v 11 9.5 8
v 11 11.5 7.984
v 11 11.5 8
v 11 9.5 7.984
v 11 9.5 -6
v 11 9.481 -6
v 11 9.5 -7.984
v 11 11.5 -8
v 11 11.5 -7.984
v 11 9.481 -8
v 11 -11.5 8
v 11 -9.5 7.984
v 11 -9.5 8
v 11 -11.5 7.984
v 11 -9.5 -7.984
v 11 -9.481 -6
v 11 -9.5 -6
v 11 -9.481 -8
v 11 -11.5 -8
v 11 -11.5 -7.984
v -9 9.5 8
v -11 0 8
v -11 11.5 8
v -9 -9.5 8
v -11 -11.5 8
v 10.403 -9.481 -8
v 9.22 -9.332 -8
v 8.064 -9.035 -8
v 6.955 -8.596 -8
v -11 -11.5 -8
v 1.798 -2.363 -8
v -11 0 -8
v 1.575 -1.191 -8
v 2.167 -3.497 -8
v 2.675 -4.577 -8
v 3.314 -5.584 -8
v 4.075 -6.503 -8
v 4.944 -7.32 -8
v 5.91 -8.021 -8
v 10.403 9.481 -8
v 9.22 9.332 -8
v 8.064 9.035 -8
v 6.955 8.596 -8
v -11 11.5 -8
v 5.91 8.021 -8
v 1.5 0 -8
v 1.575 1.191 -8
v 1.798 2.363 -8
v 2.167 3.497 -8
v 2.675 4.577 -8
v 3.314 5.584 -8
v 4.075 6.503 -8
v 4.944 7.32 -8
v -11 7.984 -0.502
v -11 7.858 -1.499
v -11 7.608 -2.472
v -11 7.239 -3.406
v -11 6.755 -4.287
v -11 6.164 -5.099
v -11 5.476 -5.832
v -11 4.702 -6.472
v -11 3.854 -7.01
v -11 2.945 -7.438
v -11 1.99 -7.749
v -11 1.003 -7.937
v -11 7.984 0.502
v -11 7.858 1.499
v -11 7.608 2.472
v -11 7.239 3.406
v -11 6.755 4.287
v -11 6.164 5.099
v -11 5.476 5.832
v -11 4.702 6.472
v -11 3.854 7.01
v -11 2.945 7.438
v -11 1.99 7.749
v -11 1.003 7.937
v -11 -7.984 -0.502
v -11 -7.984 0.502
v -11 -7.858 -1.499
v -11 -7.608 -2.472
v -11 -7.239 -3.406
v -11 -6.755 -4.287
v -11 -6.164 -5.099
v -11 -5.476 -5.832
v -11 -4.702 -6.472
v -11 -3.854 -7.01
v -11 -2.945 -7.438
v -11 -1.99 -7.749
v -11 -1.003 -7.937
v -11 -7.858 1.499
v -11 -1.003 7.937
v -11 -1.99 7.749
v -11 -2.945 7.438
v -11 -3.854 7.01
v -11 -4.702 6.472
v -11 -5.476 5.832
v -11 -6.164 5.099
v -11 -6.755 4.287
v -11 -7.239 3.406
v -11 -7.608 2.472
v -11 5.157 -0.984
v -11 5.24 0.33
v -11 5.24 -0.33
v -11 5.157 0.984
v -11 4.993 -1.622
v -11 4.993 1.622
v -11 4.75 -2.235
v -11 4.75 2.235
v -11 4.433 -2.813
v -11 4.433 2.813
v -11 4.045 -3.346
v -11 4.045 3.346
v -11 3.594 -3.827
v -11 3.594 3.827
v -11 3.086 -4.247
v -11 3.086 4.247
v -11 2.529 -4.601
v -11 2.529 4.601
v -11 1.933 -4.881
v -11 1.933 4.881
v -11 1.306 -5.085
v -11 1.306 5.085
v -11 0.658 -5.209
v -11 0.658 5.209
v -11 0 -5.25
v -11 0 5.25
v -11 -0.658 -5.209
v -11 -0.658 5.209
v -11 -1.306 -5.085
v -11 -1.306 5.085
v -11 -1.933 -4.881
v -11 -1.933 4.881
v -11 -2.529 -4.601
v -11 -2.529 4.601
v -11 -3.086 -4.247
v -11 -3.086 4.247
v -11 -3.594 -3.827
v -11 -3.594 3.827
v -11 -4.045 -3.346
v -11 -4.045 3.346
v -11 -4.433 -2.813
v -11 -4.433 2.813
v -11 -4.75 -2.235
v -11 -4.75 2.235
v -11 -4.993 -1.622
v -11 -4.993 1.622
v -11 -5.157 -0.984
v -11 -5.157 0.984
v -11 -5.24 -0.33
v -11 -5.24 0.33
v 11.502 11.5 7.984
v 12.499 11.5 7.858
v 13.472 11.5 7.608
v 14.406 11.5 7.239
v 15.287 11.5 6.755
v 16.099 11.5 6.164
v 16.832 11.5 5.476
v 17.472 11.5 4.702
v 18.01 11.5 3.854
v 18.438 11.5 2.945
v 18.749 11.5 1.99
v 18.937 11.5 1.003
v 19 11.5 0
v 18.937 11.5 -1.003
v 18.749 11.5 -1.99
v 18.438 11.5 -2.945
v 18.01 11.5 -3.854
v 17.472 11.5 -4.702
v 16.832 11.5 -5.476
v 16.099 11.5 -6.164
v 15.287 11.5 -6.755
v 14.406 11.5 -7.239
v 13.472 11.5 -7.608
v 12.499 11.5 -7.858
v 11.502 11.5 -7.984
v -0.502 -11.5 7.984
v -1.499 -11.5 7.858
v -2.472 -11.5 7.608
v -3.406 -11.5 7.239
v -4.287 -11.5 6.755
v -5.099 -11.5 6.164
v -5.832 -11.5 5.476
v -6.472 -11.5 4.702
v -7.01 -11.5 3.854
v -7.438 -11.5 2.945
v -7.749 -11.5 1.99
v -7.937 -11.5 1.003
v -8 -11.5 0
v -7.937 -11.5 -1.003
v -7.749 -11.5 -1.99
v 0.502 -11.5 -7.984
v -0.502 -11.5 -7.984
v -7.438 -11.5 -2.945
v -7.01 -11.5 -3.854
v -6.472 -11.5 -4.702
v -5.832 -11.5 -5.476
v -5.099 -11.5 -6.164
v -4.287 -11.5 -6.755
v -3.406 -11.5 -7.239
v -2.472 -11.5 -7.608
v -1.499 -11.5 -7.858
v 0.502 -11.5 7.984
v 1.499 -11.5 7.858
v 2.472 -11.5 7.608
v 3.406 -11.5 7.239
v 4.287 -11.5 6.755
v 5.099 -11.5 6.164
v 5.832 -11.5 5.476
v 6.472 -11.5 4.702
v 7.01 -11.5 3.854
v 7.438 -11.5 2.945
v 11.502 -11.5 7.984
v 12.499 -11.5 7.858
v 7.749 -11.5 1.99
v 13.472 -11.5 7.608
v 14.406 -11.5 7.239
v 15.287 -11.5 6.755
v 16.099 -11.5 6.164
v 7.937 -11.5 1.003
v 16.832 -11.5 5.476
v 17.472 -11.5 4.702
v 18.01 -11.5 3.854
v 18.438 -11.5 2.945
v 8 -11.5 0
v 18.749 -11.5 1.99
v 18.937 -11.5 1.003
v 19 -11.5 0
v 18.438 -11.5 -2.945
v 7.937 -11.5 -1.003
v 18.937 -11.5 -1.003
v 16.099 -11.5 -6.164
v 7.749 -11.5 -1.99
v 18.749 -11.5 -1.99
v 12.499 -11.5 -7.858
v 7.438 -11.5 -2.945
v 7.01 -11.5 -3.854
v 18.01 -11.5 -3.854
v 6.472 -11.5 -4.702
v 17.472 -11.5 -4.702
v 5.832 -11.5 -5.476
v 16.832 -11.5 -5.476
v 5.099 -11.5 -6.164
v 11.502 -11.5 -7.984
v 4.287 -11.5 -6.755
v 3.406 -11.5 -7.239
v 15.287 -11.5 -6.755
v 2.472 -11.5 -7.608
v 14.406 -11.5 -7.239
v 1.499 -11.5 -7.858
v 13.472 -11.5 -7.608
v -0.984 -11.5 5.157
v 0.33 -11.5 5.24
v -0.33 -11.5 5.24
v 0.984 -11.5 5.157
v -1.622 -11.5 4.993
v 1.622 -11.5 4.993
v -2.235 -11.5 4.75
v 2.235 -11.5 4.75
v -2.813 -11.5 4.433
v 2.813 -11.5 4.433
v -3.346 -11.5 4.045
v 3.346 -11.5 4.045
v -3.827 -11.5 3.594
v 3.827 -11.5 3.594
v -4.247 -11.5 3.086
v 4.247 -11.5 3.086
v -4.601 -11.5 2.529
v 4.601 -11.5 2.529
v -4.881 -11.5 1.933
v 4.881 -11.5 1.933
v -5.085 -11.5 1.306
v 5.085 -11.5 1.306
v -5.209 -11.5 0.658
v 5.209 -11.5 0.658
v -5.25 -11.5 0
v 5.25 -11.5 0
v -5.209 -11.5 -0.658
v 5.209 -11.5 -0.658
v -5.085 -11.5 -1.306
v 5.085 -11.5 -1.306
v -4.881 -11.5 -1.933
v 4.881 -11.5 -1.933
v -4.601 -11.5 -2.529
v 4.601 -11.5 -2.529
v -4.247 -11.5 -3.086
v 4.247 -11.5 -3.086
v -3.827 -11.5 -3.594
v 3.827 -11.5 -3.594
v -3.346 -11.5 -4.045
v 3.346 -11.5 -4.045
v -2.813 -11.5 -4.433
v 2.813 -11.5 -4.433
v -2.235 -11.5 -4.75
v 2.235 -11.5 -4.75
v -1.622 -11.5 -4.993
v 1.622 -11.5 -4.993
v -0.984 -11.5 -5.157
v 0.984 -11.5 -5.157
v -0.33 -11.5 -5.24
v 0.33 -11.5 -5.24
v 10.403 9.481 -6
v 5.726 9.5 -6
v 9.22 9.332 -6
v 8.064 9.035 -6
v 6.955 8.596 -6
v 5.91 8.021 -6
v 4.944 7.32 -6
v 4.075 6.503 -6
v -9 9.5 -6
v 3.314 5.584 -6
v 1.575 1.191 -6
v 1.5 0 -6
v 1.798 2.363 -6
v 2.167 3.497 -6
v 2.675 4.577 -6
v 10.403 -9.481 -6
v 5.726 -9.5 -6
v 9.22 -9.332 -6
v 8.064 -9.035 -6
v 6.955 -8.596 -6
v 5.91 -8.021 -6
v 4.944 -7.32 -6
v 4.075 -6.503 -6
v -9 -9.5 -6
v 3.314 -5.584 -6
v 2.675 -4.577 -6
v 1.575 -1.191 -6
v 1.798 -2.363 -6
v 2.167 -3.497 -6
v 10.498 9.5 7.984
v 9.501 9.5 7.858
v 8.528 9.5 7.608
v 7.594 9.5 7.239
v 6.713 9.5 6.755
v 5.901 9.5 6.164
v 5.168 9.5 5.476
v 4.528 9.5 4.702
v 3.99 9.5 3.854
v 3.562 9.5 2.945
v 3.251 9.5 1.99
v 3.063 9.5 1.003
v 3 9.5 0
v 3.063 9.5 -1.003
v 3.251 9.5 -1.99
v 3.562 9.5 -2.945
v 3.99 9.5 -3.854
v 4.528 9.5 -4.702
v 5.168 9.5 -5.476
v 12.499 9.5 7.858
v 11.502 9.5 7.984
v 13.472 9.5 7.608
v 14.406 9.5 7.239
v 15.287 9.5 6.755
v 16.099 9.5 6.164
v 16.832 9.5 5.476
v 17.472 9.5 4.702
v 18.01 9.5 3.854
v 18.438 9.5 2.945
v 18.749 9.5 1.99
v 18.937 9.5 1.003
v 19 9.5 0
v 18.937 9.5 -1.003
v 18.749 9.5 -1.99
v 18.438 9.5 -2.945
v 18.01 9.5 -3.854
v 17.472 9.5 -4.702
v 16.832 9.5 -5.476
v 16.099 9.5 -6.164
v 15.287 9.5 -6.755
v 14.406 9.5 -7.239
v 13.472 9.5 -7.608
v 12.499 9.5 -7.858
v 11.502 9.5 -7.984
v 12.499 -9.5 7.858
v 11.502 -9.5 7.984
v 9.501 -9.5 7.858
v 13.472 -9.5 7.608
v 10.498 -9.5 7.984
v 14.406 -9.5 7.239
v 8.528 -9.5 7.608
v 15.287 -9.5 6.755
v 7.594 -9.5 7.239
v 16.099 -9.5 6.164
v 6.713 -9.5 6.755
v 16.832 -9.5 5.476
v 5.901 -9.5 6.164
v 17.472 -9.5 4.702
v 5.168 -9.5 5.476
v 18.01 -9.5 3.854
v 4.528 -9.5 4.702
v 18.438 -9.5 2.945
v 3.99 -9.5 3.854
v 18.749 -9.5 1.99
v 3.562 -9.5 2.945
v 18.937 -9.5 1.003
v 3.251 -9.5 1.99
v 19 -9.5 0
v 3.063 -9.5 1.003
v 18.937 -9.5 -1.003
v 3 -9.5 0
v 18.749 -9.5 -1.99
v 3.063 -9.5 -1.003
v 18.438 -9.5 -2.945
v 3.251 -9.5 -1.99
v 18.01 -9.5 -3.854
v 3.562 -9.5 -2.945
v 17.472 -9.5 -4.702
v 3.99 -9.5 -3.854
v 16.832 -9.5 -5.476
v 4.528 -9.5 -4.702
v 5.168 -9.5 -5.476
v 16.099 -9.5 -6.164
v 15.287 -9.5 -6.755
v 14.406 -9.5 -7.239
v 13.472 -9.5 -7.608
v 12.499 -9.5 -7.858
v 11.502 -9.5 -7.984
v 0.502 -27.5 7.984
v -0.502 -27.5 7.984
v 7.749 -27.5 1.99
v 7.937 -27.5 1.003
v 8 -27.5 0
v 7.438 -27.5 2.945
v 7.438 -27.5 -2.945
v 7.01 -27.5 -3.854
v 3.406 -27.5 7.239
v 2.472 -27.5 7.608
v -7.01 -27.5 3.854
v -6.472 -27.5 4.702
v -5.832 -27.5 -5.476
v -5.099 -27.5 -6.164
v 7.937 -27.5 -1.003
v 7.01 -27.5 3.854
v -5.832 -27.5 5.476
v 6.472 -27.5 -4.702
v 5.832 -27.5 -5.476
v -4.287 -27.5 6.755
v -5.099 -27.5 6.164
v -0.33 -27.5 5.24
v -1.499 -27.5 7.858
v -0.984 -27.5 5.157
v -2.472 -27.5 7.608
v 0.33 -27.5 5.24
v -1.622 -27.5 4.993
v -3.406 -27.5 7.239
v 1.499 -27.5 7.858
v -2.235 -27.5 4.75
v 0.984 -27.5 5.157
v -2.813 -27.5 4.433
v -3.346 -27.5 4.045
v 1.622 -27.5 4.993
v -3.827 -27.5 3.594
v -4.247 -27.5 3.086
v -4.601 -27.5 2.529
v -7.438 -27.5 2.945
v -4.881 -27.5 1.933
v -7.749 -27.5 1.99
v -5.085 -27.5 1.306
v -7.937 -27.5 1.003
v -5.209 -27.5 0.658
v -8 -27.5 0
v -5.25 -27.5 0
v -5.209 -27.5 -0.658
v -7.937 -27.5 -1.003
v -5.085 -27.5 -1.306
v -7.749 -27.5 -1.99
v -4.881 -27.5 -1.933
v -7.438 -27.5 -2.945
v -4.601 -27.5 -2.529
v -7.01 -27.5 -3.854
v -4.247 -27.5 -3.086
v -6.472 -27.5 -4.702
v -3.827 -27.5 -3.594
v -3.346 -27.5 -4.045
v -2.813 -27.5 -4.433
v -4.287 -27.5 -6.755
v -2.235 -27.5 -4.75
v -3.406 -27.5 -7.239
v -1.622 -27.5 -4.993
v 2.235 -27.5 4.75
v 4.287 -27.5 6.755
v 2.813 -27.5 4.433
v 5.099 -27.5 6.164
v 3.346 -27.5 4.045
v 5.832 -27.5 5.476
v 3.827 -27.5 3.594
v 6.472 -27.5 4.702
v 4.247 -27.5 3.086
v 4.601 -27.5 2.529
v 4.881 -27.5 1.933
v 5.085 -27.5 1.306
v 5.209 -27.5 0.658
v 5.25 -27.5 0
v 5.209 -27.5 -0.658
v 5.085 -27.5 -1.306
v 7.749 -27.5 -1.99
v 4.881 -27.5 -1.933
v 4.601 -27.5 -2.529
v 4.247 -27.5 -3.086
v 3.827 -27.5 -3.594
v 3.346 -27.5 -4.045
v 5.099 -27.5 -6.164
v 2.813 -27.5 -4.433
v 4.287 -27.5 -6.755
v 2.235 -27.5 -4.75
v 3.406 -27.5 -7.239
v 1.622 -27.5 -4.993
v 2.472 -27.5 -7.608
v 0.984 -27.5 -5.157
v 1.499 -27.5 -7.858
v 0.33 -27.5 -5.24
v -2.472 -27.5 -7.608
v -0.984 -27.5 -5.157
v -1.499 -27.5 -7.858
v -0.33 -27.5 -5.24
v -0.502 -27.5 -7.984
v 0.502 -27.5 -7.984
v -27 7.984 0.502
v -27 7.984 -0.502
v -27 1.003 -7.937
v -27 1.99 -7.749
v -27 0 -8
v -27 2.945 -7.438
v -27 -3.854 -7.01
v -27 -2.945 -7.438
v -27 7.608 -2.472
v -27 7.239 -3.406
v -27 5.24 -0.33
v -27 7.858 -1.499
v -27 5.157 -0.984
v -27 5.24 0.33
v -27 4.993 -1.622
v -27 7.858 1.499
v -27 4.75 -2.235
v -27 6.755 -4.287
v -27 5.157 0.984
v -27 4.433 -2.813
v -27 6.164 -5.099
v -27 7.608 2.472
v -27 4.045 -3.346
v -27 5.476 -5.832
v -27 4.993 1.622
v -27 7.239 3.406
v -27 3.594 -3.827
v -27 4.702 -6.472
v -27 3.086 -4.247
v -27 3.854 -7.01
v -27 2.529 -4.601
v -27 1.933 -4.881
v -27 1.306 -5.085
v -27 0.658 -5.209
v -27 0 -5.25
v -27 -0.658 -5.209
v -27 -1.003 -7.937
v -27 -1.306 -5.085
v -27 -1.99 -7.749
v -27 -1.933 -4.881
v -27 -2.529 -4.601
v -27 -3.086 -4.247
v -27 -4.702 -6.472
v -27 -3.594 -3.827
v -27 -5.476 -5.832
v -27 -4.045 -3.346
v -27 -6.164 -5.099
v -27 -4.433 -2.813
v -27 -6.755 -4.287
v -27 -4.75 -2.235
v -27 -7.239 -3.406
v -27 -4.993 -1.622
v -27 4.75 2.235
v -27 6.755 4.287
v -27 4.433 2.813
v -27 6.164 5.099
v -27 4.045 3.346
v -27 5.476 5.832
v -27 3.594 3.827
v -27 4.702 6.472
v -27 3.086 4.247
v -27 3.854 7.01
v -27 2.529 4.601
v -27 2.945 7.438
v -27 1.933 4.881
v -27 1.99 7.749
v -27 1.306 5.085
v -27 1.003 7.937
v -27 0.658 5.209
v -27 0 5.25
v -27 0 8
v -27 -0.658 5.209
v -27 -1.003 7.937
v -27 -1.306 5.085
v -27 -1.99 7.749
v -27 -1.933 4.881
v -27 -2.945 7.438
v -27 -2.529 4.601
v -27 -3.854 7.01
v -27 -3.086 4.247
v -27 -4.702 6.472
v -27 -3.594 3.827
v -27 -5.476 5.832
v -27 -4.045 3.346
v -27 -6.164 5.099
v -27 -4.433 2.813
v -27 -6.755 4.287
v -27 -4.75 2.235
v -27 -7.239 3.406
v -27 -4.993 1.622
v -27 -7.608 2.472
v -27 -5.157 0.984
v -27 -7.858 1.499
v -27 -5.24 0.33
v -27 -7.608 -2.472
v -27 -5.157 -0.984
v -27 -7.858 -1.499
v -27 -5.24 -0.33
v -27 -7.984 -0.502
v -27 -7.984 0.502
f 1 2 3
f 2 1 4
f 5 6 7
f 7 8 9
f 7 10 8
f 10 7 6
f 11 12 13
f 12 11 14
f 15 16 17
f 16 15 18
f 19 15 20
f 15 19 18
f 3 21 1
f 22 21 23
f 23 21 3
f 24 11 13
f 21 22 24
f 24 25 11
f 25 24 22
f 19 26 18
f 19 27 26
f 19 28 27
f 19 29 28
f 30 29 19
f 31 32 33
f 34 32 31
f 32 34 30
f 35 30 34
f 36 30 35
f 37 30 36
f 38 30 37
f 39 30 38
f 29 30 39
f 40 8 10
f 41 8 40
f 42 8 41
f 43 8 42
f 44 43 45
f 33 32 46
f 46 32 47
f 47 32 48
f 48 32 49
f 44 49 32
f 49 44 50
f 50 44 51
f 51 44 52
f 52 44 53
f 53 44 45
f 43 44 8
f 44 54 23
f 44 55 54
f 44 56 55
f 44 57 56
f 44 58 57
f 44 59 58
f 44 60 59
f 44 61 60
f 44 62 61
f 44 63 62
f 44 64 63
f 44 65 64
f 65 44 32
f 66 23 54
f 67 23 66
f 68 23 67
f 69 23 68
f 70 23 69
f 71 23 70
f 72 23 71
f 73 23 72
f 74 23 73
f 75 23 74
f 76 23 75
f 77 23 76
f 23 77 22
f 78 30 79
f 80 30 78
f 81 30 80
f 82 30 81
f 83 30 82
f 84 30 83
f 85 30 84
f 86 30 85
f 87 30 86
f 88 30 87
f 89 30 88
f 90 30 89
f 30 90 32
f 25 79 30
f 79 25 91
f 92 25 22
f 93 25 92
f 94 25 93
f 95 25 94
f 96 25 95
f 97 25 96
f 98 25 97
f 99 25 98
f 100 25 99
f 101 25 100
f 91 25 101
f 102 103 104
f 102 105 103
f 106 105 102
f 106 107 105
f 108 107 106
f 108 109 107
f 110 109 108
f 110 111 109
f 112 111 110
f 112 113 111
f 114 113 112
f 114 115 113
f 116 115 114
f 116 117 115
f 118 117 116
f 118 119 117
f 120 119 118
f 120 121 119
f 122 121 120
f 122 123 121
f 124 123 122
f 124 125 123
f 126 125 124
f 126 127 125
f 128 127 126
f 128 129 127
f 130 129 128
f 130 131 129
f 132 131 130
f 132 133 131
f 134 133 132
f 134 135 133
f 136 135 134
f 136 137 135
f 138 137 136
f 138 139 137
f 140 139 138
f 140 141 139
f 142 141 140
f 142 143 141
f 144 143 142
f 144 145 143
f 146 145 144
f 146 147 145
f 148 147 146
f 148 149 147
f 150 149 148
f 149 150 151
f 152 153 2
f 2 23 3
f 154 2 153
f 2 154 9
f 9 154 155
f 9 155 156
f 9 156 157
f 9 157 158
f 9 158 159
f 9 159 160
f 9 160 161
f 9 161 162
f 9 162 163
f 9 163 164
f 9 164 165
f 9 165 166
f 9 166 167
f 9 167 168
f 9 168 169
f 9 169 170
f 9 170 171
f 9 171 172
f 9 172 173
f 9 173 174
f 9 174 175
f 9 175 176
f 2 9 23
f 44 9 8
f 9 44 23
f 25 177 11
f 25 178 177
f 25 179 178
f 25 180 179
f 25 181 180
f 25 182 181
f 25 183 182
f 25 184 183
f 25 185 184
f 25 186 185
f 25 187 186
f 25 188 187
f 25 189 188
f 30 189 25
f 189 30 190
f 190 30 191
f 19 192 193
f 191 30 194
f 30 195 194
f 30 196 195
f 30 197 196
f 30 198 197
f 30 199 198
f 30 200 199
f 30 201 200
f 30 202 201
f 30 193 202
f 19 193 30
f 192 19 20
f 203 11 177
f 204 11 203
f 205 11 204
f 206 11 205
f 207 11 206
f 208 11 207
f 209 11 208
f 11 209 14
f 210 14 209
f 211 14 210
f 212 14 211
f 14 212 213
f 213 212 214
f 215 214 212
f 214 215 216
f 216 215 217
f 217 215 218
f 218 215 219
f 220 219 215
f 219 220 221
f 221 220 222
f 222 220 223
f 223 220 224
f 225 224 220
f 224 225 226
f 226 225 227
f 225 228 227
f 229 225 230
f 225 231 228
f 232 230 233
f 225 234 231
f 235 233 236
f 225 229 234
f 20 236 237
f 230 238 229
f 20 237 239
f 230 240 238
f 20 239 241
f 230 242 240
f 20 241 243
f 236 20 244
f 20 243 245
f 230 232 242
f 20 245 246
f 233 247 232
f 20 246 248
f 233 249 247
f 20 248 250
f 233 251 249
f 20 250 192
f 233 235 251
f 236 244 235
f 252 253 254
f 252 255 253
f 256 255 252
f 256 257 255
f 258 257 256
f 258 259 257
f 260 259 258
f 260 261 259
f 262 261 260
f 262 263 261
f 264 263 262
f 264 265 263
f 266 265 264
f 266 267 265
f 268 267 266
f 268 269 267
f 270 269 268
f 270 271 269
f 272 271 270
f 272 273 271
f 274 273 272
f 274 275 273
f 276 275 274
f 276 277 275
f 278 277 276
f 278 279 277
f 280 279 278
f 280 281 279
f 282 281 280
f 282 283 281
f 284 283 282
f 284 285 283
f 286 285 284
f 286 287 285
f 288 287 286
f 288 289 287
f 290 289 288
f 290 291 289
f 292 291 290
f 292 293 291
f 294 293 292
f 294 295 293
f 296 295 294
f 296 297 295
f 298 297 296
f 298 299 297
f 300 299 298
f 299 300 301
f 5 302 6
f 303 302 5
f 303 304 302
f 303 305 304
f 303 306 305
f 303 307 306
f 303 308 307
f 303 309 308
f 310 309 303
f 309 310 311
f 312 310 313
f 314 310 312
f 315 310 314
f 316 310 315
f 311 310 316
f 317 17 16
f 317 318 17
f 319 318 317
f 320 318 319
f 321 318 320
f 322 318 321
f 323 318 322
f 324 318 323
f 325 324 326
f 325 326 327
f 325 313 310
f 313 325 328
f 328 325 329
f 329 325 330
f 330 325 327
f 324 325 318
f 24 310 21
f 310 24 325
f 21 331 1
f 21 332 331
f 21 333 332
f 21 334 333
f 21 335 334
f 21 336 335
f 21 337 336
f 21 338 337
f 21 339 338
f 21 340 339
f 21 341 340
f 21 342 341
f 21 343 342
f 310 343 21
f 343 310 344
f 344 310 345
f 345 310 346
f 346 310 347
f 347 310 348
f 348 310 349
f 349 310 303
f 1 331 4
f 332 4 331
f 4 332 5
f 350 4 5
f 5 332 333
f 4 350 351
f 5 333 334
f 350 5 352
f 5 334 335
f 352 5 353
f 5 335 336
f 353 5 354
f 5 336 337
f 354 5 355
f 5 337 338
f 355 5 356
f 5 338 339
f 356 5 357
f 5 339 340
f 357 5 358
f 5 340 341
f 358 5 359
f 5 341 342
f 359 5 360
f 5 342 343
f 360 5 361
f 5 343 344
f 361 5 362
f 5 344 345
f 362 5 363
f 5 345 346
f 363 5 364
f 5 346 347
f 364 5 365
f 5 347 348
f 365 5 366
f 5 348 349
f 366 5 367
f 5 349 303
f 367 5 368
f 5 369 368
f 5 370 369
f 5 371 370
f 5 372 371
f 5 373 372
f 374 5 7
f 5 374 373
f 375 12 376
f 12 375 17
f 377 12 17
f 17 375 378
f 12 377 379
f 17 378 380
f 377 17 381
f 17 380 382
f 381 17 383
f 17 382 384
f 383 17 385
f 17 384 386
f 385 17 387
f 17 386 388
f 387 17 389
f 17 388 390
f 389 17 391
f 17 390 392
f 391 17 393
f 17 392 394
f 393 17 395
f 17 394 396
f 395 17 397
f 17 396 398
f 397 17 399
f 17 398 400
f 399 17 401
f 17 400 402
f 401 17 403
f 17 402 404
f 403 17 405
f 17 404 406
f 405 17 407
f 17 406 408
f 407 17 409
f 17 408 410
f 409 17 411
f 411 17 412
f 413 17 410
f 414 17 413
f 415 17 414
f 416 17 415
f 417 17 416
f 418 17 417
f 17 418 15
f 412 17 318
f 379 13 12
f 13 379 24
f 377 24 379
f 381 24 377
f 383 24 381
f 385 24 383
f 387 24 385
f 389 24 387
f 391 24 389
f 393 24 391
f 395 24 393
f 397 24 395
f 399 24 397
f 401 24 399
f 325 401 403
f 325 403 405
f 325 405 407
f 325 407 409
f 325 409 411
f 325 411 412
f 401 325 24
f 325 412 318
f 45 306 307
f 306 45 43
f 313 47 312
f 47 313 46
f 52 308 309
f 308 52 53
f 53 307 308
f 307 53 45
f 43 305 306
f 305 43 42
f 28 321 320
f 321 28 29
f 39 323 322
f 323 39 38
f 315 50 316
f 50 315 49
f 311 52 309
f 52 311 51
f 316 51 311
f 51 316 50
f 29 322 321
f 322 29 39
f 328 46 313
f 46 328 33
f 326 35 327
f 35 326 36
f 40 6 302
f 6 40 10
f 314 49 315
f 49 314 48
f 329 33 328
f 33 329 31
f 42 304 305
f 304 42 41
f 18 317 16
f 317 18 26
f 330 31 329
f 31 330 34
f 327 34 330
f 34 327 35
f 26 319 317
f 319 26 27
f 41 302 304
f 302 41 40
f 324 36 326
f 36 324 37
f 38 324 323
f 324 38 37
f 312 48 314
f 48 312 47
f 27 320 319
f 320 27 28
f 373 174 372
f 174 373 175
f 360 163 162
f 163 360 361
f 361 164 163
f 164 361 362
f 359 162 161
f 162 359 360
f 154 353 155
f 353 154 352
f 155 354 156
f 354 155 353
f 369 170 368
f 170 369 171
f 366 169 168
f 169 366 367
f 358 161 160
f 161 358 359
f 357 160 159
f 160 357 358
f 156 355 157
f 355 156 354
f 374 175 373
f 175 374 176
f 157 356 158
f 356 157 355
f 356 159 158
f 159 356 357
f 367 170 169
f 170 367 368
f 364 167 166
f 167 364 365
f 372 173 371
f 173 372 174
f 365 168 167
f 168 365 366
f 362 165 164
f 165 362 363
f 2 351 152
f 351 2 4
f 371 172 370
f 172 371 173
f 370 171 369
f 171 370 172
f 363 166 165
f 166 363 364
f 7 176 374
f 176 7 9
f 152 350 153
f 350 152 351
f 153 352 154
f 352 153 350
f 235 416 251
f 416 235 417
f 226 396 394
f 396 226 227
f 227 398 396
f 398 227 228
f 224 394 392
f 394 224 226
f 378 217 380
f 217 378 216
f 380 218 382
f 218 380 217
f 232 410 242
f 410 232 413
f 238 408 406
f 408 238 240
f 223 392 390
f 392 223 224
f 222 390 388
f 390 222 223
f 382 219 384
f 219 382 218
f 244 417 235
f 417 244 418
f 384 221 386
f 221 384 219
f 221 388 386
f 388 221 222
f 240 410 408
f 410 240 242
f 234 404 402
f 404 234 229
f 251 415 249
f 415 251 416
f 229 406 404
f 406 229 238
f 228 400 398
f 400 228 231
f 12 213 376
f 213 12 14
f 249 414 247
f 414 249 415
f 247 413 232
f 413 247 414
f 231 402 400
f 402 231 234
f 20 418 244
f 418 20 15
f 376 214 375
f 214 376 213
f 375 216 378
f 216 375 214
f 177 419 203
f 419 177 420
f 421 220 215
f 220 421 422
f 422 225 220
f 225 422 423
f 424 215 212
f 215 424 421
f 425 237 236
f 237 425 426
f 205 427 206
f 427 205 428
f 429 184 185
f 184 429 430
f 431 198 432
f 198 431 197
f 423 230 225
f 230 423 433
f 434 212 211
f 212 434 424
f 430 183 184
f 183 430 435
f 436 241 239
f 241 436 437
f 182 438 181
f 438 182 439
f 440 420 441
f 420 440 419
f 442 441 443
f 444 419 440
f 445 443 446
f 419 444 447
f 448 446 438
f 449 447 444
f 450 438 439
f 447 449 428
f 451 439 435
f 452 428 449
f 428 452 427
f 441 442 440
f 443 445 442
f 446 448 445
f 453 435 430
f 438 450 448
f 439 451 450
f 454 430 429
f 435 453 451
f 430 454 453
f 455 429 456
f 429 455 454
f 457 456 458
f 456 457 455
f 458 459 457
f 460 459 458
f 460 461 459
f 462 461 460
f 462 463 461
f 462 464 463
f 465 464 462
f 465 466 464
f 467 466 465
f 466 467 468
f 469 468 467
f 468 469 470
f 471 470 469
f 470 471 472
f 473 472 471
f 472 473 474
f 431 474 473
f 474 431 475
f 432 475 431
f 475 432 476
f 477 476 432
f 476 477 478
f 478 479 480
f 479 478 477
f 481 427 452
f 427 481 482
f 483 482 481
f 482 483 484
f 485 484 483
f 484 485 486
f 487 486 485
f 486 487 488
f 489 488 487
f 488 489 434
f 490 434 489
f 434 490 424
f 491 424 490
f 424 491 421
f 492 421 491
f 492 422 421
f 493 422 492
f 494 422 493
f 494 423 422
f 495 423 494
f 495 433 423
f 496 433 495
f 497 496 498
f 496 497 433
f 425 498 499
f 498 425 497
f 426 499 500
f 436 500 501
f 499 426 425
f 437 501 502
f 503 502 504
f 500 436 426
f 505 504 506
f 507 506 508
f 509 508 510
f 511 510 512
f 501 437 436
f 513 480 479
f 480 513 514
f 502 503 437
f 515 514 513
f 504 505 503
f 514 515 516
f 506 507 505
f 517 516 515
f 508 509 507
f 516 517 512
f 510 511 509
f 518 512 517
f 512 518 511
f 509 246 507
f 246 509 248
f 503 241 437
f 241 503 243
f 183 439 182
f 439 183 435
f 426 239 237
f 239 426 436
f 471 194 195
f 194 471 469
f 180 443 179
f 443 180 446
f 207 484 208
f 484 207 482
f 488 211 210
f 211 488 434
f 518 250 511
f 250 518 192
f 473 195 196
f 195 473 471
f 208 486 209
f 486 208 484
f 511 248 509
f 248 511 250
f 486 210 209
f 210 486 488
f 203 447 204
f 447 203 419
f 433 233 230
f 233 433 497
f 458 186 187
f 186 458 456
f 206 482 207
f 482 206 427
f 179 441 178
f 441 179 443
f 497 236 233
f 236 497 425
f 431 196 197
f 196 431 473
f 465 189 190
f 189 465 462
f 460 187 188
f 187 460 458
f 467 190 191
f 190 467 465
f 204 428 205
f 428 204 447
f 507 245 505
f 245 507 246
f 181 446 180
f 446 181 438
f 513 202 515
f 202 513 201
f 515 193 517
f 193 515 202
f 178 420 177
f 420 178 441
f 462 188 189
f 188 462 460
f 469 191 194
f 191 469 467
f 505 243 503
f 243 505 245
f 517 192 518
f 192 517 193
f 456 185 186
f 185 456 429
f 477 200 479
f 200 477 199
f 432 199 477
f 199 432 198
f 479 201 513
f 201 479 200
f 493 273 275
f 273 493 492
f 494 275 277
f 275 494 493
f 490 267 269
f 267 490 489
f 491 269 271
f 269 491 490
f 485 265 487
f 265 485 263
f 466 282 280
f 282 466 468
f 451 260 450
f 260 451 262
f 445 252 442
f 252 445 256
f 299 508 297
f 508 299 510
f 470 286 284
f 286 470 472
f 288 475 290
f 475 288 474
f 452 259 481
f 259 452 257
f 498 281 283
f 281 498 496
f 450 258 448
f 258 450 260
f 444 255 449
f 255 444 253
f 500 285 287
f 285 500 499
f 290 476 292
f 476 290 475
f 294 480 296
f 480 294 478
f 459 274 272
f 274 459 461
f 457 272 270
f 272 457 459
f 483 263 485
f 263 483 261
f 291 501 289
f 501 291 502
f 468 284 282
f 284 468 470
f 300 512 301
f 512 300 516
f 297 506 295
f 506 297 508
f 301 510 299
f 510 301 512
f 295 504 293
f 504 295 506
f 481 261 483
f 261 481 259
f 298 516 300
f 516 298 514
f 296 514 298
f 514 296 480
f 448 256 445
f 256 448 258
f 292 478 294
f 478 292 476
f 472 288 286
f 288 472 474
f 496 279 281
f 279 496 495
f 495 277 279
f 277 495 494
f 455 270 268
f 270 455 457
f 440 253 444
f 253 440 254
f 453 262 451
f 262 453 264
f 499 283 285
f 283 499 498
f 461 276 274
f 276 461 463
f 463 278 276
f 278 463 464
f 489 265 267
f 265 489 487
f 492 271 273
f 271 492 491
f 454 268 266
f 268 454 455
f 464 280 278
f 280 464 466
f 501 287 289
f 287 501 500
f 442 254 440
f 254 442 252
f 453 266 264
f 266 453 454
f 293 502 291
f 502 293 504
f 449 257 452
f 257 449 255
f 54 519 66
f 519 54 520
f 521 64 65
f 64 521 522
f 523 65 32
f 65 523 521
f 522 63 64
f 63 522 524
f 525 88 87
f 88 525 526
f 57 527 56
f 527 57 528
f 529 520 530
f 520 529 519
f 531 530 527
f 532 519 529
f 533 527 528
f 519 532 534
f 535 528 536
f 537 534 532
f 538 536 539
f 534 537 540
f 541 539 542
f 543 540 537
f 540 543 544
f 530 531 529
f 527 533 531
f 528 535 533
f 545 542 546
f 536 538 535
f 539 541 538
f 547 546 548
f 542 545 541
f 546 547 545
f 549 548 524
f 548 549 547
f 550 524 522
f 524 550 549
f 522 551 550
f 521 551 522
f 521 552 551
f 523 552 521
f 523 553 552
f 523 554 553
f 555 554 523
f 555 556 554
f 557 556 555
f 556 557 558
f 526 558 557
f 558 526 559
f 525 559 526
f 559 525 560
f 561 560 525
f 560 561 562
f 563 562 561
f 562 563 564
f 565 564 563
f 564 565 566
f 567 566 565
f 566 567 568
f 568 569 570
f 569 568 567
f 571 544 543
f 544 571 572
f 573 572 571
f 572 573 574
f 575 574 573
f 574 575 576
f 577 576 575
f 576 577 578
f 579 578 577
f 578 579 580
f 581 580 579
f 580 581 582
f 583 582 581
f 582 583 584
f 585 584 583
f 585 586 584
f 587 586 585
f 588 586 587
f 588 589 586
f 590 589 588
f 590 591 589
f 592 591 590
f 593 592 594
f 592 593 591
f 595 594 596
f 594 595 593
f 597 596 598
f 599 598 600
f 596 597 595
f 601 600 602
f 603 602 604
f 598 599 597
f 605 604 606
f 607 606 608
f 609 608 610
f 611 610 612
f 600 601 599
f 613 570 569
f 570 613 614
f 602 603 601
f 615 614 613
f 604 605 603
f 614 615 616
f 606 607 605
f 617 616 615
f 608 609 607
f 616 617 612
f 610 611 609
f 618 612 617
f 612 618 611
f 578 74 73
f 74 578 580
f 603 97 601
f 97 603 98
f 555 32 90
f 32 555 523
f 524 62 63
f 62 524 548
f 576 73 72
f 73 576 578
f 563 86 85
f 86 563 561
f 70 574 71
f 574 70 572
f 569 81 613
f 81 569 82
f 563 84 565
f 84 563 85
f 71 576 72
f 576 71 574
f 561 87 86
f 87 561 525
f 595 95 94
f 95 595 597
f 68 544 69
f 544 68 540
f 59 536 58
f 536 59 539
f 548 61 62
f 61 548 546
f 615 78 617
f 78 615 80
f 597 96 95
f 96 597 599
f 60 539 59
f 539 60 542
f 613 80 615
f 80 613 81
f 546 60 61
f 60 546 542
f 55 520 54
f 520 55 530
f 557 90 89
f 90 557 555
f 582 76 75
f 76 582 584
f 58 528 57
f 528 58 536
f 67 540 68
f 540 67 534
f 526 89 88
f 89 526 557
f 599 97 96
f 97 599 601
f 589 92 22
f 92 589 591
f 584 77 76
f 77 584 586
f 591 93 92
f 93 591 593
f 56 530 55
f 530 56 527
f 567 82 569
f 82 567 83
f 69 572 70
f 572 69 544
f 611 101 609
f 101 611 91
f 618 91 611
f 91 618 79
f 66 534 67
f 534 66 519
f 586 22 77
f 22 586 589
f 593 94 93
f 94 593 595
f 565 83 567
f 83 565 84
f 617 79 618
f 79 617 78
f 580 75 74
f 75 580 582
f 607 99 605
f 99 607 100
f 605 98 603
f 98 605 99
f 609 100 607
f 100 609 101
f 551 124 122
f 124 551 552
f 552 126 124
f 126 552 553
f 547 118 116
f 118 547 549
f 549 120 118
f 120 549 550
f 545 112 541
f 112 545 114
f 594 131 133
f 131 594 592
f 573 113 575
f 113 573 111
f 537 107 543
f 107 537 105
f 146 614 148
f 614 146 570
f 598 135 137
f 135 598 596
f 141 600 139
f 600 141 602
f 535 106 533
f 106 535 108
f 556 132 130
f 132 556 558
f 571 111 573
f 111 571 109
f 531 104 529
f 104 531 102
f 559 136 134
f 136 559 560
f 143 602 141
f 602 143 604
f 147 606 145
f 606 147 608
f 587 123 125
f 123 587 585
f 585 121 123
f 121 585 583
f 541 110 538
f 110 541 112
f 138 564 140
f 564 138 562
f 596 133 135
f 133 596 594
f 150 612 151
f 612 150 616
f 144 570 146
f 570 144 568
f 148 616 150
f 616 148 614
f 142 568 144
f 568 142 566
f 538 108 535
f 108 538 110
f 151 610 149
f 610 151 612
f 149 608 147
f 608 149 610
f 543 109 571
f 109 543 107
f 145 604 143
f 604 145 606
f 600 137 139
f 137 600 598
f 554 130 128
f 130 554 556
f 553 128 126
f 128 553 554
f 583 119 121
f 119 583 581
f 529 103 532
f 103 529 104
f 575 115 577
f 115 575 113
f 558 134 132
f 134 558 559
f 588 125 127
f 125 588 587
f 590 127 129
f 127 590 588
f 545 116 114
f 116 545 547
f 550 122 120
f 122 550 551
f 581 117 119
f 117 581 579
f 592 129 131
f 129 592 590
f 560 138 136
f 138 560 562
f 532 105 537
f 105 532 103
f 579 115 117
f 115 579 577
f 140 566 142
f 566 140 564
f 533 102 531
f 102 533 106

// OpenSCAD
$fn=50;

out_cube_x = 22;
out_cube_y = 23;
out_cube_z = 16;

cylinder_in_d = 10.5;
cylinder_h = 16;

x_wall = 2;
y_wall = 2;
z_wall = 2;

cylinder_out_d = out_cube_z;

in_cube_x = out_cube_x - x_wall;
in_cube_y = out_cube_y - 2 * y_wall;
in_cube_z = out_cube_z - z_wall;

x_offset = 0.5 * x_wall;
y_offset = 0;
z_offset = 0.5 * z_wall;

module cage1() {
difference() {
    cube([out_cube_x, out_cube_y, out_cube_z], true);
    translate([x_offset, y_offset, z_offset]) cube([in_cube_x, in_cube_y, in_cube_z], true);
    translate([0.5*in_cube_x+x_offset, 0, -0.5*in_cube_z]) cylinder(d=in_cube_y, h=z_wall, center=true);
    }

translate([0.5*out_cube_x, 0.5*(out_cube_y-y_wall), 0]) rotate([90, 0, 0]) cylinder(h=y_wall, d=out_cube_z, center=true);
translate([0.5*out_cube_x, -0.5*(out_cube_y-y_wall), 0]) rotate([90, 0, 0]) cylinder(h=y_wall, d=out_cube_z, center=true);
}

module cylinder_mount() {
    difference() {
        cylinder(h=cylinder_h, d=cylinder_out_d, center=true);
        cylinder(h=cylinder_h, d=cylinder_in_d, center=true);
    }
}



cage1();
//translate([0, 0.5*(out_cube_y+cylinder_h), 0]) rotate([90, 0, 0]) cylinder_mount();
translate([0, -0.5*(out_cube_y+cylinder_h), 0]) rotate([90, 0, 0]) cylinder_mount();
translate([-0.5*(out_cube_x+cylinder_h), 0, 0]) rotate([0, 90, 0]) cylinder_mount();
